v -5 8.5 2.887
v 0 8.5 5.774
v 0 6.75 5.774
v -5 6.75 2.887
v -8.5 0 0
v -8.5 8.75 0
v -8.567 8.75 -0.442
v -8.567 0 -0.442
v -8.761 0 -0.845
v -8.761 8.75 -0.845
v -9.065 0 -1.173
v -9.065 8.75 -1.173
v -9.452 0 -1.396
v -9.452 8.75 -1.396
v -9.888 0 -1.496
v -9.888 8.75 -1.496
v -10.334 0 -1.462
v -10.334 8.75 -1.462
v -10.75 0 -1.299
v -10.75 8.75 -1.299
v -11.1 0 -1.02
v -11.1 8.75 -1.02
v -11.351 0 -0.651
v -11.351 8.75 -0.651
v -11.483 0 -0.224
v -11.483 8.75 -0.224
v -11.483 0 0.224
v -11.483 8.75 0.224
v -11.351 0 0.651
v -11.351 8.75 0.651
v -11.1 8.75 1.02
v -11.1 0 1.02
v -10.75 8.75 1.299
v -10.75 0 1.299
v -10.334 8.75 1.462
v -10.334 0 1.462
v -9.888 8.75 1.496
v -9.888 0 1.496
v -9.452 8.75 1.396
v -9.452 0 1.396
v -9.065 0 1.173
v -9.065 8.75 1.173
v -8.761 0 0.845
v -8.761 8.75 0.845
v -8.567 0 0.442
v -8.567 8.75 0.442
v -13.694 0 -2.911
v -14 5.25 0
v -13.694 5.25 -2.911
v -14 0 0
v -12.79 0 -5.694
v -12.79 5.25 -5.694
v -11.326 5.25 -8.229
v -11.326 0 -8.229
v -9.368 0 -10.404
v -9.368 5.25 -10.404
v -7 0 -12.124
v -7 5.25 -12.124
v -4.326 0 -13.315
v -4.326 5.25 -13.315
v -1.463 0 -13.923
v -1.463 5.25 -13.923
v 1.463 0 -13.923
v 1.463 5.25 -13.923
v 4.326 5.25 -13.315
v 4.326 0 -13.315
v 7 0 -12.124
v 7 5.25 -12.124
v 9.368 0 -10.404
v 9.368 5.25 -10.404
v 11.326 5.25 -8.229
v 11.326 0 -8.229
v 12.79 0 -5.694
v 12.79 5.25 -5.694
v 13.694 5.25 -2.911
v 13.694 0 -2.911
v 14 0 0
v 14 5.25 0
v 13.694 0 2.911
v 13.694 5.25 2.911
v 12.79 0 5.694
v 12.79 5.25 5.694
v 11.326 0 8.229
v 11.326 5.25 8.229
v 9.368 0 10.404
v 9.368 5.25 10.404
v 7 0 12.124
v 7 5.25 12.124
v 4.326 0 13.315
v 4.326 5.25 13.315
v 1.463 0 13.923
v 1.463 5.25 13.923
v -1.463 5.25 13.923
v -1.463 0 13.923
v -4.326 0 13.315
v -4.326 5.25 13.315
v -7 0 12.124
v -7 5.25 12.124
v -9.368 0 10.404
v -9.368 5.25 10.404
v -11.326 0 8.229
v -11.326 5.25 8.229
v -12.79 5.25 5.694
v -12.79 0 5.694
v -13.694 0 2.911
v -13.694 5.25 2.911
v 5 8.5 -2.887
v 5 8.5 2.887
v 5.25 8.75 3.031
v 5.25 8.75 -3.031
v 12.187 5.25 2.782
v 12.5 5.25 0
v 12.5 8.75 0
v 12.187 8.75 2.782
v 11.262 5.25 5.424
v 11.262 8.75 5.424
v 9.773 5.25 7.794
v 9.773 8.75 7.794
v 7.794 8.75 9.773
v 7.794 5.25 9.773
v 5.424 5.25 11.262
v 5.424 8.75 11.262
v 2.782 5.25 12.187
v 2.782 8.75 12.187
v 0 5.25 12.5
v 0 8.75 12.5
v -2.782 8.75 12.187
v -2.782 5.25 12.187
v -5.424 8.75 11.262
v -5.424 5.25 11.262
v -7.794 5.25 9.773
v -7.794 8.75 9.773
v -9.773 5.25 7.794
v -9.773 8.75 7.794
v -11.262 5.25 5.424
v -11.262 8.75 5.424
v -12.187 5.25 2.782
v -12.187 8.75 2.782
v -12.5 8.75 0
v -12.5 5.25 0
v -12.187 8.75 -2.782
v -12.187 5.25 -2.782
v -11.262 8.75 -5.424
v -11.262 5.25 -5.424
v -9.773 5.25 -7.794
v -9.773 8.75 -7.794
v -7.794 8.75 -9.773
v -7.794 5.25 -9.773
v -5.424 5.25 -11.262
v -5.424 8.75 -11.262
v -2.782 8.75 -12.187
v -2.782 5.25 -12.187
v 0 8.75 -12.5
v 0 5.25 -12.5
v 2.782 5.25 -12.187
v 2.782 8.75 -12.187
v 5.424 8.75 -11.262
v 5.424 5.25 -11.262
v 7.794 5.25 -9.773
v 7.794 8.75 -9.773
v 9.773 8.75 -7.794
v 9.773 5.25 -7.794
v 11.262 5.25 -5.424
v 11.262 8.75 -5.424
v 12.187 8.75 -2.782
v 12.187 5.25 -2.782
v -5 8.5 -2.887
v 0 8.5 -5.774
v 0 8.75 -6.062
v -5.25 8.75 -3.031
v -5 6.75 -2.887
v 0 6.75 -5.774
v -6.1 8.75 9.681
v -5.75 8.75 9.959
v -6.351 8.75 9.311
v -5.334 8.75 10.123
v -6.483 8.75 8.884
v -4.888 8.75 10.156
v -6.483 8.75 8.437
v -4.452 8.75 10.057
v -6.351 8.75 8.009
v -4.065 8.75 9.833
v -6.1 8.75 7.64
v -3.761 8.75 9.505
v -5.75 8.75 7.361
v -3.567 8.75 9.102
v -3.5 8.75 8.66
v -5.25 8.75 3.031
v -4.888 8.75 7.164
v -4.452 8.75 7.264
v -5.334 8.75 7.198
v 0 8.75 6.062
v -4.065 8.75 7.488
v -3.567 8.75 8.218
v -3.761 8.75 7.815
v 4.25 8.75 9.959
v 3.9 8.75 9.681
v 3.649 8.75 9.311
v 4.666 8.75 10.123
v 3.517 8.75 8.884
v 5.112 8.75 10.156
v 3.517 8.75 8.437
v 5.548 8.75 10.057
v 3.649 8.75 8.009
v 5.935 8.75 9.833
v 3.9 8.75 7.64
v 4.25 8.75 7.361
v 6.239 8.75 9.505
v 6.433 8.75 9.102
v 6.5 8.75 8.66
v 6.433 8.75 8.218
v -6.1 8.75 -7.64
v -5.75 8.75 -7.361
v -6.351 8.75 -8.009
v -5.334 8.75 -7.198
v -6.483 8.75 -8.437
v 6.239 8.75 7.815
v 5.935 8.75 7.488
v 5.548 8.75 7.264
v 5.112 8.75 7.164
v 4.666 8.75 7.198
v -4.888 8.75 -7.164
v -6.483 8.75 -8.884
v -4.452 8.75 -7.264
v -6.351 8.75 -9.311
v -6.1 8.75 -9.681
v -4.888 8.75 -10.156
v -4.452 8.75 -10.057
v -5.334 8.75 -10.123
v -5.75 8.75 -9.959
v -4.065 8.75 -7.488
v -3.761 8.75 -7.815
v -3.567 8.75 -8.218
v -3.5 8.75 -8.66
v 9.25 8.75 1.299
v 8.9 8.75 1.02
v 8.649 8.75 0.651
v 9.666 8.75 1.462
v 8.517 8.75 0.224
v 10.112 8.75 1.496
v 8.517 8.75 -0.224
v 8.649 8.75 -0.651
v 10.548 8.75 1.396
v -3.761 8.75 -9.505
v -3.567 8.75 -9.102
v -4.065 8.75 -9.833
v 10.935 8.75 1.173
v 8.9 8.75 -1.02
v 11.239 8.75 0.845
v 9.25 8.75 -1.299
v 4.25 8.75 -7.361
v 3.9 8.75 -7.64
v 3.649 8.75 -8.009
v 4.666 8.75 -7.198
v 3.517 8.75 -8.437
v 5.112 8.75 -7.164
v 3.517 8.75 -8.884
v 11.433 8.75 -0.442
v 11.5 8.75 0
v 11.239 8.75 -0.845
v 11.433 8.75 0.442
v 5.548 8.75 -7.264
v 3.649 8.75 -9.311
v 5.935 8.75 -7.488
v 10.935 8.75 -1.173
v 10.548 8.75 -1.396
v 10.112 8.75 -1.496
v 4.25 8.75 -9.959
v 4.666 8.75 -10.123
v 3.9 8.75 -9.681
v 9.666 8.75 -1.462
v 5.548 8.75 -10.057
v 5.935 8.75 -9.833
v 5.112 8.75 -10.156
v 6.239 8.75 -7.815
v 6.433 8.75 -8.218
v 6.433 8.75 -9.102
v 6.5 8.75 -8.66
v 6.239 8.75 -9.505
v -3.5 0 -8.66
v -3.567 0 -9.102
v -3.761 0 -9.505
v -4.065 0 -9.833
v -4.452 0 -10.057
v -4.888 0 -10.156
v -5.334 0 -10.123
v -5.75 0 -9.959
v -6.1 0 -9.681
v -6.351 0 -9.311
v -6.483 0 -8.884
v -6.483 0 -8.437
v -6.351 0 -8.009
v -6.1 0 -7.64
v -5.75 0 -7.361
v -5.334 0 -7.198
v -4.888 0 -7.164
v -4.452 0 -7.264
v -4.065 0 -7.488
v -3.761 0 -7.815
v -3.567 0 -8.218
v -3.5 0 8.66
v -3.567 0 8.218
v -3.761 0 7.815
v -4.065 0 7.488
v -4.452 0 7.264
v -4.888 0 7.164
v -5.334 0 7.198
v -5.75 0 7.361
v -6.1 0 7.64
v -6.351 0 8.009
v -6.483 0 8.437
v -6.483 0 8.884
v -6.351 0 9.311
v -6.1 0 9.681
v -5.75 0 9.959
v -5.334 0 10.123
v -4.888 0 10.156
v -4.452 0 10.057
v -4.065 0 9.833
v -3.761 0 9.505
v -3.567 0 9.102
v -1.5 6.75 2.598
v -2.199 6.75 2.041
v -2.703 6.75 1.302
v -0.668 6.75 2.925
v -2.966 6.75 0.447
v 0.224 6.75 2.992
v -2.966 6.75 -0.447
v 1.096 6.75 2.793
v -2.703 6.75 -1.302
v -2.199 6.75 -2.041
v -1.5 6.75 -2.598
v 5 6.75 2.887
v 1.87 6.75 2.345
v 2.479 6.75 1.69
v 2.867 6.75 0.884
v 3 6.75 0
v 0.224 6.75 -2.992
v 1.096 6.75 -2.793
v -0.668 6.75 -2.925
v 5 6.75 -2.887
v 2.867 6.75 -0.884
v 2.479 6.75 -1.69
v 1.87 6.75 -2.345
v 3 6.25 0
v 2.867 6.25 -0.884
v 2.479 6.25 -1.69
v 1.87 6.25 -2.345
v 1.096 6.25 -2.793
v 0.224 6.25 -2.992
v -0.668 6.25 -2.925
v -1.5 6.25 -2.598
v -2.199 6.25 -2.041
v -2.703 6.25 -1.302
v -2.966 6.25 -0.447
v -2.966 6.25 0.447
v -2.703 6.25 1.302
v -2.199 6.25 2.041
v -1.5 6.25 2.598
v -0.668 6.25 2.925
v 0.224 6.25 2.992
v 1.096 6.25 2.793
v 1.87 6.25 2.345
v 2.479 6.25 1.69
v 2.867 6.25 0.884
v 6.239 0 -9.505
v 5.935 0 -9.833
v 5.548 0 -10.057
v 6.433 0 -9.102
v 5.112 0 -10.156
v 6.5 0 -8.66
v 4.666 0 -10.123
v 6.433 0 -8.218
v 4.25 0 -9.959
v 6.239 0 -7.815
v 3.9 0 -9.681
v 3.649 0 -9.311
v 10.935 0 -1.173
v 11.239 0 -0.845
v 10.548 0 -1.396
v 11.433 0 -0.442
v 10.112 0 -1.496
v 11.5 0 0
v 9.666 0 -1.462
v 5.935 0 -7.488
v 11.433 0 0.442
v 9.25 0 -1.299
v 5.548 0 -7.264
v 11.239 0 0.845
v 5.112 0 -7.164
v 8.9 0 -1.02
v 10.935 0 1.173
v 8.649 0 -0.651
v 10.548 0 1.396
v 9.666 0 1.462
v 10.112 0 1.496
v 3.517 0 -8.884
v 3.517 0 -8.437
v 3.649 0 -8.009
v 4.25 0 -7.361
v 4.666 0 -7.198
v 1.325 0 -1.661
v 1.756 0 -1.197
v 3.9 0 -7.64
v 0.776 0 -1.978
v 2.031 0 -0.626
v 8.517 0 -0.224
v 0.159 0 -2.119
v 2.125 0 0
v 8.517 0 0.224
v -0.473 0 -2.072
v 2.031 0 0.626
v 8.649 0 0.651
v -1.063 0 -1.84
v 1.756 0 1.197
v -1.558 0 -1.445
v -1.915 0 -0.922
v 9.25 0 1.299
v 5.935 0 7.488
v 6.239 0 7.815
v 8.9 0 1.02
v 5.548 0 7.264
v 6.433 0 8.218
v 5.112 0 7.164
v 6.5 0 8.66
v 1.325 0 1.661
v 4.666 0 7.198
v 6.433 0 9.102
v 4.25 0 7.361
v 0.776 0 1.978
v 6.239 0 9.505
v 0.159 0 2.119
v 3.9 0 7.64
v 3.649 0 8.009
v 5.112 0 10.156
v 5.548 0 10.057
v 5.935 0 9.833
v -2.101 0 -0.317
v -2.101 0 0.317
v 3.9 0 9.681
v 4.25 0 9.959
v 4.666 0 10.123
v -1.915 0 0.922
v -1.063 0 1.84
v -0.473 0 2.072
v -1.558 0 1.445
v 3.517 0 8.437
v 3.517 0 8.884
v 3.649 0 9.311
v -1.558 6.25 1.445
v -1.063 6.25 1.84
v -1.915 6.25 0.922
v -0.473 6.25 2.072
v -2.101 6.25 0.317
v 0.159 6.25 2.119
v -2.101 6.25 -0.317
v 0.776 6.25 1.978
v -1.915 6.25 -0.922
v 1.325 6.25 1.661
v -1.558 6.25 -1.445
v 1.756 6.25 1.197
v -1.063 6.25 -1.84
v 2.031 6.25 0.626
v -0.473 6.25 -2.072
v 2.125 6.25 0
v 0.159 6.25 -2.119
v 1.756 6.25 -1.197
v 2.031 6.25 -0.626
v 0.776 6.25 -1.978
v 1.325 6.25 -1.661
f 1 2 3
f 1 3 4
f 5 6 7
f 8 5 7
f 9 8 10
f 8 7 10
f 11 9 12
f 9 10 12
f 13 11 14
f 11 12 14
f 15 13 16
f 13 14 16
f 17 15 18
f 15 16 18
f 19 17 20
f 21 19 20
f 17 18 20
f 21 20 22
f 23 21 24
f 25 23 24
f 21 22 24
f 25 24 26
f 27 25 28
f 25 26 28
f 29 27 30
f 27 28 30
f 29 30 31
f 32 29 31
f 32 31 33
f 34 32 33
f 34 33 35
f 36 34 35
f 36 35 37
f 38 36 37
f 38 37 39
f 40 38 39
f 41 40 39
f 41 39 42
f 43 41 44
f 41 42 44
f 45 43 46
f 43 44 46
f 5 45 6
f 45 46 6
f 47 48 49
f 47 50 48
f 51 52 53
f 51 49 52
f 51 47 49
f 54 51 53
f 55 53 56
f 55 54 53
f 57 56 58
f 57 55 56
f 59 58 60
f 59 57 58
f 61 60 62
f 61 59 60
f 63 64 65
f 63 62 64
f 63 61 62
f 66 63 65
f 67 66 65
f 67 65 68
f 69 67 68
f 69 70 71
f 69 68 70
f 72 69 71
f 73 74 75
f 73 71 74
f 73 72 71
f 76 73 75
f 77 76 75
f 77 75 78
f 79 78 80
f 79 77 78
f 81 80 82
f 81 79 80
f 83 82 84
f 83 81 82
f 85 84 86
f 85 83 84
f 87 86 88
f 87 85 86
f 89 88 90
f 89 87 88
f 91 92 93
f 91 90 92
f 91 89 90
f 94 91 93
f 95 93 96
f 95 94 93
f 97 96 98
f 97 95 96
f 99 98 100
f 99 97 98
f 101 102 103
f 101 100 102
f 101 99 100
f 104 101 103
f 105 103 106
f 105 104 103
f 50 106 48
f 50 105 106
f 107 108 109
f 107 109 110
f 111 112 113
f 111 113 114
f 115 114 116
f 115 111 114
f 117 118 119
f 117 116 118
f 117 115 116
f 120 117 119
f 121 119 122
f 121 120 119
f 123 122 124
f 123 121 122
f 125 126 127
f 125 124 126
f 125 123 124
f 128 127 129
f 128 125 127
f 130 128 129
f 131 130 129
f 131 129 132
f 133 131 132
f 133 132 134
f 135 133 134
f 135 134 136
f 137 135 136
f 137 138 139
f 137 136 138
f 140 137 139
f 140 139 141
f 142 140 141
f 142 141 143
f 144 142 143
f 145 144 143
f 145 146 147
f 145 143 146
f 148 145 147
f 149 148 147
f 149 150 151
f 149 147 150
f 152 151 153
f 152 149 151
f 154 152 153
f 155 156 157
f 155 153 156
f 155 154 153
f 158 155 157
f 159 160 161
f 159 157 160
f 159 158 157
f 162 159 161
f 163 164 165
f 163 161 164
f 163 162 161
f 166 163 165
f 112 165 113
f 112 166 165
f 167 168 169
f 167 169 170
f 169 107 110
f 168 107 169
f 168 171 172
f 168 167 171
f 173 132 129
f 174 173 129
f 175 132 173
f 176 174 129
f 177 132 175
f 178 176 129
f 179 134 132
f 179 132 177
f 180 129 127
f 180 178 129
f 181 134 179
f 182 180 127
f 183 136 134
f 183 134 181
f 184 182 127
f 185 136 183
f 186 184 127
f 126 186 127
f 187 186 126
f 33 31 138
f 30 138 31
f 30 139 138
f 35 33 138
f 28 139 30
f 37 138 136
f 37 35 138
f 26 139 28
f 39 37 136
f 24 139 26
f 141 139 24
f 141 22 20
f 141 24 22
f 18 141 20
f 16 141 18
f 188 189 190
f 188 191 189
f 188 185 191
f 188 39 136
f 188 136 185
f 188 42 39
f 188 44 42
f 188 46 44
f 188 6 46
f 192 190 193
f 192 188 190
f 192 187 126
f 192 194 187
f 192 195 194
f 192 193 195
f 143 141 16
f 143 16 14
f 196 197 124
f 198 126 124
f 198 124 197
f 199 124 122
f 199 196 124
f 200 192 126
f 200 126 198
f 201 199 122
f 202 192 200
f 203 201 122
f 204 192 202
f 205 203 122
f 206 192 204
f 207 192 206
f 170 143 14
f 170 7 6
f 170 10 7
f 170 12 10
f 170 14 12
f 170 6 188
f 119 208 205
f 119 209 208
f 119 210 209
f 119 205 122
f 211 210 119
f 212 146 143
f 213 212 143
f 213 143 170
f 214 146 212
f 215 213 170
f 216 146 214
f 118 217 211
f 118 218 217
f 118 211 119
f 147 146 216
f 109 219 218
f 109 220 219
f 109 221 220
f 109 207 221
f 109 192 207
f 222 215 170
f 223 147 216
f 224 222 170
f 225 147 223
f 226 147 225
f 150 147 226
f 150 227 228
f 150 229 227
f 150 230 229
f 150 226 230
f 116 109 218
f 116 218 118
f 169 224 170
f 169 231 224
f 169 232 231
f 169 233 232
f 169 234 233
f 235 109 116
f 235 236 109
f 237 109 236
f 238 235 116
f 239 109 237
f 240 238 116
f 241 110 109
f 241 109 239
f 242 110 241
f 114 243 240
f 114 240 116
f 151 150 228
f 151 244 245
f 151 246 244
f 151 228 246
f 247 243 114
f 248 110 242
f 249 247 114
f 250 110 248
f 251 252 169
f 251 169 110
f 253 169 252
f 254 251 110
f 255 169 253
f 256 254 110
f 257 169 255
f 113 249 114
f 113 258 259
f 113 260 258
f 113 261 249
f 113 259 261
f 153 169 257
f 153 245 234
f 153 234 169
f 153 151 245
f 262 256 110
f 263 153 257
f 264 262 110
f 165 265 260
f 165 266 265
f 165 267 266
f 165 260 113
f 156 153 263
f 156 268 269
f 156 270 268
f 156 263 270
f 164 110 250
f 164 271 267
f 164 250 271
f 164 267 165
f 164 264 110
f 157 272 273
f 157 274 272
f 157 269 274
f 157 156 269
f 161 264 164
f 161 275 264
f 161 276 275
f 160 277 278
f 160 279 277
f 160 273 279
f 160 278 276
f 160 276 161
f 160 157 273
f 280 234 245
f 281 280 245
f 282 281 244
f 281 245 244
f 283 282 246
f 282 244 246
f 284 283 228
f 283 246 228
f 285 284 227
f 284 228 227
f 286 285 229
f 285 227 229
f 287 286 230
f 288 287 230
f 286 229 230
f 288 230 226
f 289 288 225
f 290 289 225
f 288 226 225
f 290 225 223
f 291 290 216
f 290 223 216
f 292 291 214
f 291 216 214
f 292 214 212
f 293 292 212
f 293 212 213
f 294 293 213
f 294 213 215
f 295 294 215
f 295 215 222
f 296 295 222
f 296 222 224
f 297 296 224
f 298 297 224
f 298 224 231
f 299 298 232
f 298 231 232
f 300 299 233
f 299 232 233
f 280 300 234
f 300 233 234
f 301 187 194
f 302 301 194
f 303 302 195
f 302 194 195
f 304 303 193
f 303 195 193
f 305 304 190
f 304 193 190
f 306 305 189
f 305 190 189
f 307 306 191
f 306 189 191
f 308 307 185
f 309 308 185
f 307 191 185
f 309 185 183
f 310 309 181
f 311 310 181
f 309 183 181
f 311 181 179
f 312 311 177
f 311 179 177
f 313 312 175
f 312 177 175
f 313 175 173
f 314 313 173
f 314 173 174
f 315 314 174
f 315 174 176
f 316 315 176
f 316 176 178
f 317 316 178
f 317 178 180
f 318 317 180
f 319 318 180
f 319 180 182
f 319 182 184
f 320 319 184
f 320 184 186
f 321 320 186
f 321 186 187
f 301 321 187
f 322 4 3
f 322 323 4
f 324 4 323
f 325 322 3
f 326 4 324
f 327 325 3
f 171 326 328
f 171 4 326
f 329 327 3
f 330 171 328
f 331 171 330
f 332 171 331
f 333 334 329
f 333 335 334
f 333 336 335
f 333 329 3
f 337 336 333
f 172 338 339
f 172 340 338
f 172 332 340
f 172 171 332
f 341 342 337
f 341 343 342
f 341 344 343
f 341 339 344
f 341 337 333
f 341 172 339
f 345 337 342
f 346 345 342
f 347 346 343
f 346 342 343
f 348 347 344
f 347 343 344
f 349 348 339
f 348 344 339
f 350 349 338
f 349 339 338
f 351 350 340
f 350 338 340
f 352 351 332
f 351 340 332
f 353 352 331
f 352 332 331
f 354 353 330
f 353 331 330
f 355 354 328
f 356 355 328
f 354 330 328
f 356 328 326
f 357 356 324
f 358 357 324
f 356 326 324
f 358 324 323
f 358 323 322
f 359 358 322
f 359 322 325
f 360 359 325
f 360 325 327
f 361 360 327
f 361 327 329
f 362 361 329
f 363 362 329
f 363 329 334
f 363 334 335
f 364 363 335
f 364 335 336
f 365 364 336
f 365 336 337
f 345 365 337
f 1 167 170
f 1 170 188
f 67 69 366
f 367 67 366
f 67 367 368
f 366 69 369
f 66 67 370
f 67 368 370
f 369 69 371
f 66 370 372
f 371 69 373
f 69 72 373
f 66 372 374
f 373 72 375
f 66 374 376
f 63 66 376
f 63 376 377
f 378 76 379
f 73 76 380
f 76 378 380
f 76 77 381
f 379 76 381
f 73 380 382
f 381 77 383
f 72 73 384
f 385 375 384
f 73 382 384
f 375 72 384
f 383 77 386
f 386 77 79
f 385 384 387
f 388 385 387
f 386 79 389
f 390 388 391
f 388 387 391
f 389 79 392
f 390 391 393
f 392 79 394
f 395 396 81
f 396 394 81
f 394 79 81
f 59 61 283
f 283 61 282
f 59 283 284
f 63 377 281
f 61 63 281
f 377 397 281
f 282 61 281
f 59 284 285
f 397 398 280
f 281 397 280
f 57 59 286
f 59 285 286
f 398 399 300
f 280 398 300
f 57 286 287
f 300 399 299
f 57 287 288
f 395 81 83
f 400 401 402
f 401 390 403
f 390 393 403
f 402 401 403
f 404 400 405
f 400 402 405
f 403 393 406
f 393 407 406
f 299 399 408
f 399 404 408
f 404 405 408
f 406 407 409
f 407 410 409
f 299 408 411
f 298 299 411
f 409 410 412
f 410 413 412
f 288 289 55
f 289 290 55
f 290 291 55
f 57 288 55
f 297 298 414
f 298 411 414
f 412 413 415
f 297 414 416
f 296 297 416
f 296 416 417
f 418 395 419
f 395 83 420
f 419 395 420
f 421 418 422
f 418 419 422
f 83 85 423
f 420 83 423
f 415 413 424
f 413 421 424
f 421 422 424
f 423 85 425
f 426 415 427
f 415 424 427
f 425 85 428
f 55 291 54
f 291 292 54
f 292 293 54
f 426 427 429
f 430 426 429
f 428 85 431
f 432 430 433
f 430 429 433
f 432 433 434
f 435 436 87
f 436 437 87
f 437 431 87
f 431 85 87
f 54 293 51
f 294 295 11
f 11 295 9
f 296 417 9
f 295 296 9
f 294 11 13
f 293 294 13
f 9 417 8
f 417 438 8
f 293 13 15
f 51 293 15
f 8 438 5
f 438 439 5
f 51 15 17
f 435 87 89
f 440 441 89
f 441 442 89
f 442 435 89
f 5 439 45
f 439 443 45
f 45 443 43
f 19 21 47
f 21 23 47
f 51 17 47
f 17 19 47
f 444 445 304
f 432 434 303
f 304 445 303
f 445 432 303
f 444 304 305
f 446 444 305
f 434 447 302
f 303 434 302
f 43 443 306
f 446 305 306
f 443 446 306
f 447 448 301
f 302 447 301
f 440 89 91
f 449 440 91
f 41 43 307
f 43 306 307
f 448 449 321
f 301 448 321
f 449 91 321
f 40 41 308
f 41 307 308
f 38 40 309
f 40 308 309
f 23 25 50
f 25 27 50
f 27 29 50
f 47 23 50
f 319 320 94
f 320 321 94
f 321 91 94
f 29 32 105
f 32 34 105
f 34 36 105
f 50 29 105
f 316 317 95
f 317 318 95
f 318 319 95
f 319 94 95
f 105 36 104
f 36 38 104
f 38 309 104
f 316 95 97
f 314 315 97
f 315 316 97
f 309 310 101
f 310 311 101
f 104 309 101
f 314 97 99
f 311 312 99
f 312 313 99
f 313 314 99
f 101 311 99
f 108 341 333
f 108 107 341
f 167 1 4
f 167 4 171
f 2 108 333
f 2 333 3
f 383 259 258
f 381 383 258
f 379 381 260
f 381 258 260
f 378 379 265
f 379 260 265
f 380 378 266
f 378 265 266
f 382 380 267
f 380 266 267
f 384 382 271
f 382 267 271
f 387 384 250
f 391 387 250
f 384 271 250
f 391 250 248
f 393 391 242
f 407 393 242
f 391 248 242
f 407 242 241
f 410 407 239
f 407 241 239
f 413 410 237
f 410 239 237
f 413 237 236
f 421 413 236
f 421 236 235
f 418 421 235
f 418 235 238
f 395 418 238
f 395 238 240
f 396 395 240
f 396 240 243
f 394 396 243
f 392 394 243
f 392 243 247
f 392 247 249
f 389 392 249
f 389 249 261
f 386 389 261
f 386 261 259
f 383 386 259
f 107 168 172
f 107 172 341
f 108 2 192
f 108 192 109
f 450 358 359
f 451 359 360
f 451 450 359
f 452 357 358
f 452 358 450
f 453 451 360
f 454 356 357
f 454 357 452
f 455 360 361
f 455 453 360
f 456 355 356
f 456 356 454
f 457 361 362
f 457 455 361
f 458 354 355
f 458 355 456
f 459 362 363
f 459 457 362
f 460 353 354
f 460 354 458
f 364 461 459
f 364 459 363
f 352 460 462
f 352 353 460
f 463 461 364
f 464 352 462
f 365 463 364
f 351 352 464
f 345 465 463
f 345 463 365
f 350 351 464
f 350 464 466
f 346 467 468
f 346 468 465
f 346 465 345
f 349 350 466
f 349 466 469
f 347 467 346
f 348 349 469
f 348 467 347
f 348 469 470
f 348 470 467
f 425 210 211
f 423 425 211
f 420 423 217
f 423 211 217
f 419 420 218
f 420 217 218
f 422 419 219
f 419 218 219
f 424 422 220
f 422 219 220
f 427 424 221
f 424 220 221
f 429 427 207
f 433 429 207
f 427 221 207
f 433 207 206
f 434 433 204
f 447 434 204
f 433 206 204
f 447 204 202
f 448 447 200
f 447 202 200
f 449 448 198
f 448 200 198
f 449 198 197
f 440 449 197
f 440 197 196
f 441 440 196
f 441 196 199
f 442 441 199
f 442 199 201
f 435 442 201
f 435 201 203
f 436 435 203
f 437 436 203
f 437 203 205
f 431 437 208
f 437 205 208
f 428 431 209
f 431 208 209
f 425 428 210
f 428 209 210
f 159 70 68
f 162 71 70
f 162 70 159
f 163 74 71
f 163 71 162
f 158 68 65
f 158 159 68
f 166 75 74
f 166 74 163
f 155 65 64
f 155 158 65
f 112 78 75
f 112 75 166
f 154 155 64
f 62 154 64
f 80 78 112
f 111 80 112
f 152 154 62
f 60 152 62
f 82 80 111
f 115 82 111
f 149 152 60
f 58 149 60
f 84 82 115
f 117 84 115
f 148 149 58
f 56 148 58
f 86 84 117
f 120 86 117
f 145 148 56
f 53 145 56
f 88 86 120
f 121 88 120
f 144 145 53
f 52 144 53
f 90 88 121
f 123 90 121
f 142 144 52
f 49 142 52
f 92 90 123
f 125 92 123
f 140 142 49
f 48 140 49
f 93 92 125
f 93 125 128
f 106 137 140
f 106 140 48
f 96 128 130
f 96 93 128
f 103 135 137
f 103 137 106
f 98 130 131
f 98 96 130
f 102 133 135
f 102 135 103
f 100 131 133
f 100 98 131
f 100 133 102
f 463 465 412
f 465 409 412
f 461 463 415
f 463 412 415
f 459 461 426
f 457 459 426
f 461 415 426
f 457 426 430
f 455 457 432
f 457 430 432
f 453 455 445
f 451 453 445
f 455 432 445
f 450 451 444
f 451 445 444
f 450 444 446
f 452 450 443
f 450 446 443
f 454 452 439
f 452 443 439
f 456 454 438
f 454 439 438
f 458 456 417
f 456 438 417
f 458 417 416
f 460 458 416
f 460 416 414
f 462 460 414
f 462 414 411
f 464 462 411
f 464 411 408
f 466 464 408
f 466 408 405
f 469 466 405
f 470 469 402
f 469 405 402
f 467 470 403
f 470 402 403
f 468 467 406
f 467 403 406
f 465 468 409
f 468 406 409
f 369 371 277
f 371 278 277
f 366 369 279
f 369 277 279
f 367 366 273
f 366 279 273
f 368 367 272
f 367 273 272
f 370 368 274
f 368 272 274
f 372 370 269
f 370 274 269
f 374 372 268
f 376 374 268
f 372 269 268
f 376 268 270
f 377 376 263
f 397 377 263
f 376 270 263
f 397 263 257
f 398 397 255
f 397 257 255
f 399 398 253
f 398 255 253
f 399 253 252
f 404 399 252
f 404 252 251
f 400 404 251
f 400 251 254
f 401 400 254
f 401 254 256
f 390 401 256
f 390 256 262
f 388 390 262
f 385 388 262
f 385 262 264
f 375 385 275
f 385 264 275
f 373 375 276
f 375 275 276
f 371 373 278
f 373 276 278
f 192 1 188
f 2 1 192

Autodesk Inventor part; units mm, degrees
ref_plane "YZ Plane" through (0, 0, 0) normal (1, 0, 0) x (0, 1, 0)
ref_plane "XZ Plane" through (0, 0, 0) normal (0, 1, 0) x (-1, 0, 0)
ref_plane "XY Plane" through (0, 0, 0) normal (0, 0, 1) x (1, 0, 0)
sketch "Sketch1" plane through (0, 0, 0) normal (0, 1, 0) x (-1, 0, 0)
  circle A0 centre (0, 0) radius 14
  dimension "d0" = 28
extrude "Extrusion1" add sketch "Sketch1" along normal blind 5.25
sketch "Sketch2" plane through (0, 5.25, 0) normal (0, 1, 0) x (1, 0, 0)
  circle A0 centre (0, 0) radius 12.5
  dimension "d3" = 25
extrude "Extrusion2" add sketch "Sketch2" along normal blind 3.5
sketch "Sketch3" plane through (0, 8.75, 0) normal (0, 1, 0) x (1, 0, 0)
  circle A0 centre (-10, 0) radius 1.5
  circle A1 centre (-5, -8.6603) radius 1.5
  circle A2 centre (5, -8.6603) radius 1.5
  circle A3 centre (10, 0) radius 1.5
  circle A4 centre (5, 8.6603) radius 1.5
  circle A5 centre (-5, 8.6603) radius 1.5
  arc A6 (-10, -4) -> (-10, 4) centre (-10, 0) ccw
  line L0 (-10, 4) -> (-11.8427, 4)
  circle A7 centre (0, 0) radius 12.5 projected
  line L1 (-10, -4) -> (-11.8427, -4)
  circle A8 centre (-5, -8.6603) radius 1.5
  arc A9 (-1.5359, -10.6603) -> (-8.4641, -6.6603) centre (-5, -8.6603) ccw
  line L2 (-8.4641, -6.6603) -> (-9.3855, -8.2561)
  line L3 (-1.5359, -10.6603) -> (-2.4573, -12.2561)
  circle A10 centre (5, -8.6603) radius 1.5
  arc A11 (8.4641, -6.6603) -> (1.5359, -10.6603) centre (5, -8.6603) ccw
  line L4 (1.5359, -10.6603) -> (2.4573, -12.2561)
  line L5 (8.4641, -6.6603) -> (9.3855, -8.2561)
  circle A12 centre (10, 0) radius 1.5
  arc A13 (10, 4) -> (10, -4) centre (10, 0) ccw
  line L6 (10, -4) -> (11.8427, -4)
  line L7 (10, 4) -> (11.8427, 4)
  circle A14 centre (5, 8.6603) radius 1.5
  arc A15 (1.5359, 10.6603) -> (8.4641, 6.6603) centre (5, 8.6603) ccw
  line L8 (8.4641, 6.6603) -> (9.3855, 8.2561)
  line L9 (1.5359, 10.6603) -> (2.4573, 12.2561)
  circle A16 centre (-5, 8.6603) radius 1.5
  arc A17 (-8.4641, 6.6603) -> (-1.5359, 10.6603) centre (-5, 8.6603) ccw
  line L10 (-1.5359, 10.6603) -> (-2.4573, 12.2561)
  line L11 (-8.4641, 6.6603) -> (-9.3855, 8.2561)
  dimension "d10" = 360
  dimension "d15" = 8
  dimension "d18" = 360
extrude "Extrusion3" cut sketch "Sketch3" against normal through all contours A0 | A1 | A2 | A3 | A4 | A5
sketch "Sketch4" plane through (0, 8.75, 0) normal (0, 1, 0) x (1, 0, 0)
  line L0 (0, -5.7735) -> (-5, -2.8868)
  line L1 (-5, -2.8868) -> (-5, 2.8868)
  line L2 (-5, 2.8868) -> (0, 5.7735)
  line L3 (0, 5.7735) -> (5, 2.8868)
  line L4 (5, 2.8868) -> (5, -2.8868)
  line L5 (5, -2.8868) -> (0, -5.7735)
  point P0 (0, 0)
  point P1 (0, 0)
  dimension "d22" = 5
extrude "Extrusion4" cut sketch "Sketch4" against normal blind 2
sketch "Sketch5" plane through (0, 0, 0) normal (0, -1, 0) x (1, 0, 0)
  circle A0 centre (0, 0) radius 2.125
  dimension "d28" = 4.25
extrude "Extrusion5" cut sketch "Sketch5" against normal through all
chamfer "Chamfer2" distance 0.25 angle 45 6 edges at (2.5, 8.75, 4.3301) (5, 8.75, 0) (2.5, 8.75, -4.3301) (-2.5, 8.75, -4.3301) (-5, 8.75, 0) (-2.5, 8.75, 4.3301)
sketch "Sketch6" plane through (0, 6.75, 0) normal (0, 1, 0) x (1, 0, 0)
  circle A0 centre (0, 0) radius 3
  dimension "d34" = 6
extrude "Extrusion6" cut sketch "Sketch6" against normal blind 0.5
properties part number "Shaft_Joint1" material "ABS Plastic"
